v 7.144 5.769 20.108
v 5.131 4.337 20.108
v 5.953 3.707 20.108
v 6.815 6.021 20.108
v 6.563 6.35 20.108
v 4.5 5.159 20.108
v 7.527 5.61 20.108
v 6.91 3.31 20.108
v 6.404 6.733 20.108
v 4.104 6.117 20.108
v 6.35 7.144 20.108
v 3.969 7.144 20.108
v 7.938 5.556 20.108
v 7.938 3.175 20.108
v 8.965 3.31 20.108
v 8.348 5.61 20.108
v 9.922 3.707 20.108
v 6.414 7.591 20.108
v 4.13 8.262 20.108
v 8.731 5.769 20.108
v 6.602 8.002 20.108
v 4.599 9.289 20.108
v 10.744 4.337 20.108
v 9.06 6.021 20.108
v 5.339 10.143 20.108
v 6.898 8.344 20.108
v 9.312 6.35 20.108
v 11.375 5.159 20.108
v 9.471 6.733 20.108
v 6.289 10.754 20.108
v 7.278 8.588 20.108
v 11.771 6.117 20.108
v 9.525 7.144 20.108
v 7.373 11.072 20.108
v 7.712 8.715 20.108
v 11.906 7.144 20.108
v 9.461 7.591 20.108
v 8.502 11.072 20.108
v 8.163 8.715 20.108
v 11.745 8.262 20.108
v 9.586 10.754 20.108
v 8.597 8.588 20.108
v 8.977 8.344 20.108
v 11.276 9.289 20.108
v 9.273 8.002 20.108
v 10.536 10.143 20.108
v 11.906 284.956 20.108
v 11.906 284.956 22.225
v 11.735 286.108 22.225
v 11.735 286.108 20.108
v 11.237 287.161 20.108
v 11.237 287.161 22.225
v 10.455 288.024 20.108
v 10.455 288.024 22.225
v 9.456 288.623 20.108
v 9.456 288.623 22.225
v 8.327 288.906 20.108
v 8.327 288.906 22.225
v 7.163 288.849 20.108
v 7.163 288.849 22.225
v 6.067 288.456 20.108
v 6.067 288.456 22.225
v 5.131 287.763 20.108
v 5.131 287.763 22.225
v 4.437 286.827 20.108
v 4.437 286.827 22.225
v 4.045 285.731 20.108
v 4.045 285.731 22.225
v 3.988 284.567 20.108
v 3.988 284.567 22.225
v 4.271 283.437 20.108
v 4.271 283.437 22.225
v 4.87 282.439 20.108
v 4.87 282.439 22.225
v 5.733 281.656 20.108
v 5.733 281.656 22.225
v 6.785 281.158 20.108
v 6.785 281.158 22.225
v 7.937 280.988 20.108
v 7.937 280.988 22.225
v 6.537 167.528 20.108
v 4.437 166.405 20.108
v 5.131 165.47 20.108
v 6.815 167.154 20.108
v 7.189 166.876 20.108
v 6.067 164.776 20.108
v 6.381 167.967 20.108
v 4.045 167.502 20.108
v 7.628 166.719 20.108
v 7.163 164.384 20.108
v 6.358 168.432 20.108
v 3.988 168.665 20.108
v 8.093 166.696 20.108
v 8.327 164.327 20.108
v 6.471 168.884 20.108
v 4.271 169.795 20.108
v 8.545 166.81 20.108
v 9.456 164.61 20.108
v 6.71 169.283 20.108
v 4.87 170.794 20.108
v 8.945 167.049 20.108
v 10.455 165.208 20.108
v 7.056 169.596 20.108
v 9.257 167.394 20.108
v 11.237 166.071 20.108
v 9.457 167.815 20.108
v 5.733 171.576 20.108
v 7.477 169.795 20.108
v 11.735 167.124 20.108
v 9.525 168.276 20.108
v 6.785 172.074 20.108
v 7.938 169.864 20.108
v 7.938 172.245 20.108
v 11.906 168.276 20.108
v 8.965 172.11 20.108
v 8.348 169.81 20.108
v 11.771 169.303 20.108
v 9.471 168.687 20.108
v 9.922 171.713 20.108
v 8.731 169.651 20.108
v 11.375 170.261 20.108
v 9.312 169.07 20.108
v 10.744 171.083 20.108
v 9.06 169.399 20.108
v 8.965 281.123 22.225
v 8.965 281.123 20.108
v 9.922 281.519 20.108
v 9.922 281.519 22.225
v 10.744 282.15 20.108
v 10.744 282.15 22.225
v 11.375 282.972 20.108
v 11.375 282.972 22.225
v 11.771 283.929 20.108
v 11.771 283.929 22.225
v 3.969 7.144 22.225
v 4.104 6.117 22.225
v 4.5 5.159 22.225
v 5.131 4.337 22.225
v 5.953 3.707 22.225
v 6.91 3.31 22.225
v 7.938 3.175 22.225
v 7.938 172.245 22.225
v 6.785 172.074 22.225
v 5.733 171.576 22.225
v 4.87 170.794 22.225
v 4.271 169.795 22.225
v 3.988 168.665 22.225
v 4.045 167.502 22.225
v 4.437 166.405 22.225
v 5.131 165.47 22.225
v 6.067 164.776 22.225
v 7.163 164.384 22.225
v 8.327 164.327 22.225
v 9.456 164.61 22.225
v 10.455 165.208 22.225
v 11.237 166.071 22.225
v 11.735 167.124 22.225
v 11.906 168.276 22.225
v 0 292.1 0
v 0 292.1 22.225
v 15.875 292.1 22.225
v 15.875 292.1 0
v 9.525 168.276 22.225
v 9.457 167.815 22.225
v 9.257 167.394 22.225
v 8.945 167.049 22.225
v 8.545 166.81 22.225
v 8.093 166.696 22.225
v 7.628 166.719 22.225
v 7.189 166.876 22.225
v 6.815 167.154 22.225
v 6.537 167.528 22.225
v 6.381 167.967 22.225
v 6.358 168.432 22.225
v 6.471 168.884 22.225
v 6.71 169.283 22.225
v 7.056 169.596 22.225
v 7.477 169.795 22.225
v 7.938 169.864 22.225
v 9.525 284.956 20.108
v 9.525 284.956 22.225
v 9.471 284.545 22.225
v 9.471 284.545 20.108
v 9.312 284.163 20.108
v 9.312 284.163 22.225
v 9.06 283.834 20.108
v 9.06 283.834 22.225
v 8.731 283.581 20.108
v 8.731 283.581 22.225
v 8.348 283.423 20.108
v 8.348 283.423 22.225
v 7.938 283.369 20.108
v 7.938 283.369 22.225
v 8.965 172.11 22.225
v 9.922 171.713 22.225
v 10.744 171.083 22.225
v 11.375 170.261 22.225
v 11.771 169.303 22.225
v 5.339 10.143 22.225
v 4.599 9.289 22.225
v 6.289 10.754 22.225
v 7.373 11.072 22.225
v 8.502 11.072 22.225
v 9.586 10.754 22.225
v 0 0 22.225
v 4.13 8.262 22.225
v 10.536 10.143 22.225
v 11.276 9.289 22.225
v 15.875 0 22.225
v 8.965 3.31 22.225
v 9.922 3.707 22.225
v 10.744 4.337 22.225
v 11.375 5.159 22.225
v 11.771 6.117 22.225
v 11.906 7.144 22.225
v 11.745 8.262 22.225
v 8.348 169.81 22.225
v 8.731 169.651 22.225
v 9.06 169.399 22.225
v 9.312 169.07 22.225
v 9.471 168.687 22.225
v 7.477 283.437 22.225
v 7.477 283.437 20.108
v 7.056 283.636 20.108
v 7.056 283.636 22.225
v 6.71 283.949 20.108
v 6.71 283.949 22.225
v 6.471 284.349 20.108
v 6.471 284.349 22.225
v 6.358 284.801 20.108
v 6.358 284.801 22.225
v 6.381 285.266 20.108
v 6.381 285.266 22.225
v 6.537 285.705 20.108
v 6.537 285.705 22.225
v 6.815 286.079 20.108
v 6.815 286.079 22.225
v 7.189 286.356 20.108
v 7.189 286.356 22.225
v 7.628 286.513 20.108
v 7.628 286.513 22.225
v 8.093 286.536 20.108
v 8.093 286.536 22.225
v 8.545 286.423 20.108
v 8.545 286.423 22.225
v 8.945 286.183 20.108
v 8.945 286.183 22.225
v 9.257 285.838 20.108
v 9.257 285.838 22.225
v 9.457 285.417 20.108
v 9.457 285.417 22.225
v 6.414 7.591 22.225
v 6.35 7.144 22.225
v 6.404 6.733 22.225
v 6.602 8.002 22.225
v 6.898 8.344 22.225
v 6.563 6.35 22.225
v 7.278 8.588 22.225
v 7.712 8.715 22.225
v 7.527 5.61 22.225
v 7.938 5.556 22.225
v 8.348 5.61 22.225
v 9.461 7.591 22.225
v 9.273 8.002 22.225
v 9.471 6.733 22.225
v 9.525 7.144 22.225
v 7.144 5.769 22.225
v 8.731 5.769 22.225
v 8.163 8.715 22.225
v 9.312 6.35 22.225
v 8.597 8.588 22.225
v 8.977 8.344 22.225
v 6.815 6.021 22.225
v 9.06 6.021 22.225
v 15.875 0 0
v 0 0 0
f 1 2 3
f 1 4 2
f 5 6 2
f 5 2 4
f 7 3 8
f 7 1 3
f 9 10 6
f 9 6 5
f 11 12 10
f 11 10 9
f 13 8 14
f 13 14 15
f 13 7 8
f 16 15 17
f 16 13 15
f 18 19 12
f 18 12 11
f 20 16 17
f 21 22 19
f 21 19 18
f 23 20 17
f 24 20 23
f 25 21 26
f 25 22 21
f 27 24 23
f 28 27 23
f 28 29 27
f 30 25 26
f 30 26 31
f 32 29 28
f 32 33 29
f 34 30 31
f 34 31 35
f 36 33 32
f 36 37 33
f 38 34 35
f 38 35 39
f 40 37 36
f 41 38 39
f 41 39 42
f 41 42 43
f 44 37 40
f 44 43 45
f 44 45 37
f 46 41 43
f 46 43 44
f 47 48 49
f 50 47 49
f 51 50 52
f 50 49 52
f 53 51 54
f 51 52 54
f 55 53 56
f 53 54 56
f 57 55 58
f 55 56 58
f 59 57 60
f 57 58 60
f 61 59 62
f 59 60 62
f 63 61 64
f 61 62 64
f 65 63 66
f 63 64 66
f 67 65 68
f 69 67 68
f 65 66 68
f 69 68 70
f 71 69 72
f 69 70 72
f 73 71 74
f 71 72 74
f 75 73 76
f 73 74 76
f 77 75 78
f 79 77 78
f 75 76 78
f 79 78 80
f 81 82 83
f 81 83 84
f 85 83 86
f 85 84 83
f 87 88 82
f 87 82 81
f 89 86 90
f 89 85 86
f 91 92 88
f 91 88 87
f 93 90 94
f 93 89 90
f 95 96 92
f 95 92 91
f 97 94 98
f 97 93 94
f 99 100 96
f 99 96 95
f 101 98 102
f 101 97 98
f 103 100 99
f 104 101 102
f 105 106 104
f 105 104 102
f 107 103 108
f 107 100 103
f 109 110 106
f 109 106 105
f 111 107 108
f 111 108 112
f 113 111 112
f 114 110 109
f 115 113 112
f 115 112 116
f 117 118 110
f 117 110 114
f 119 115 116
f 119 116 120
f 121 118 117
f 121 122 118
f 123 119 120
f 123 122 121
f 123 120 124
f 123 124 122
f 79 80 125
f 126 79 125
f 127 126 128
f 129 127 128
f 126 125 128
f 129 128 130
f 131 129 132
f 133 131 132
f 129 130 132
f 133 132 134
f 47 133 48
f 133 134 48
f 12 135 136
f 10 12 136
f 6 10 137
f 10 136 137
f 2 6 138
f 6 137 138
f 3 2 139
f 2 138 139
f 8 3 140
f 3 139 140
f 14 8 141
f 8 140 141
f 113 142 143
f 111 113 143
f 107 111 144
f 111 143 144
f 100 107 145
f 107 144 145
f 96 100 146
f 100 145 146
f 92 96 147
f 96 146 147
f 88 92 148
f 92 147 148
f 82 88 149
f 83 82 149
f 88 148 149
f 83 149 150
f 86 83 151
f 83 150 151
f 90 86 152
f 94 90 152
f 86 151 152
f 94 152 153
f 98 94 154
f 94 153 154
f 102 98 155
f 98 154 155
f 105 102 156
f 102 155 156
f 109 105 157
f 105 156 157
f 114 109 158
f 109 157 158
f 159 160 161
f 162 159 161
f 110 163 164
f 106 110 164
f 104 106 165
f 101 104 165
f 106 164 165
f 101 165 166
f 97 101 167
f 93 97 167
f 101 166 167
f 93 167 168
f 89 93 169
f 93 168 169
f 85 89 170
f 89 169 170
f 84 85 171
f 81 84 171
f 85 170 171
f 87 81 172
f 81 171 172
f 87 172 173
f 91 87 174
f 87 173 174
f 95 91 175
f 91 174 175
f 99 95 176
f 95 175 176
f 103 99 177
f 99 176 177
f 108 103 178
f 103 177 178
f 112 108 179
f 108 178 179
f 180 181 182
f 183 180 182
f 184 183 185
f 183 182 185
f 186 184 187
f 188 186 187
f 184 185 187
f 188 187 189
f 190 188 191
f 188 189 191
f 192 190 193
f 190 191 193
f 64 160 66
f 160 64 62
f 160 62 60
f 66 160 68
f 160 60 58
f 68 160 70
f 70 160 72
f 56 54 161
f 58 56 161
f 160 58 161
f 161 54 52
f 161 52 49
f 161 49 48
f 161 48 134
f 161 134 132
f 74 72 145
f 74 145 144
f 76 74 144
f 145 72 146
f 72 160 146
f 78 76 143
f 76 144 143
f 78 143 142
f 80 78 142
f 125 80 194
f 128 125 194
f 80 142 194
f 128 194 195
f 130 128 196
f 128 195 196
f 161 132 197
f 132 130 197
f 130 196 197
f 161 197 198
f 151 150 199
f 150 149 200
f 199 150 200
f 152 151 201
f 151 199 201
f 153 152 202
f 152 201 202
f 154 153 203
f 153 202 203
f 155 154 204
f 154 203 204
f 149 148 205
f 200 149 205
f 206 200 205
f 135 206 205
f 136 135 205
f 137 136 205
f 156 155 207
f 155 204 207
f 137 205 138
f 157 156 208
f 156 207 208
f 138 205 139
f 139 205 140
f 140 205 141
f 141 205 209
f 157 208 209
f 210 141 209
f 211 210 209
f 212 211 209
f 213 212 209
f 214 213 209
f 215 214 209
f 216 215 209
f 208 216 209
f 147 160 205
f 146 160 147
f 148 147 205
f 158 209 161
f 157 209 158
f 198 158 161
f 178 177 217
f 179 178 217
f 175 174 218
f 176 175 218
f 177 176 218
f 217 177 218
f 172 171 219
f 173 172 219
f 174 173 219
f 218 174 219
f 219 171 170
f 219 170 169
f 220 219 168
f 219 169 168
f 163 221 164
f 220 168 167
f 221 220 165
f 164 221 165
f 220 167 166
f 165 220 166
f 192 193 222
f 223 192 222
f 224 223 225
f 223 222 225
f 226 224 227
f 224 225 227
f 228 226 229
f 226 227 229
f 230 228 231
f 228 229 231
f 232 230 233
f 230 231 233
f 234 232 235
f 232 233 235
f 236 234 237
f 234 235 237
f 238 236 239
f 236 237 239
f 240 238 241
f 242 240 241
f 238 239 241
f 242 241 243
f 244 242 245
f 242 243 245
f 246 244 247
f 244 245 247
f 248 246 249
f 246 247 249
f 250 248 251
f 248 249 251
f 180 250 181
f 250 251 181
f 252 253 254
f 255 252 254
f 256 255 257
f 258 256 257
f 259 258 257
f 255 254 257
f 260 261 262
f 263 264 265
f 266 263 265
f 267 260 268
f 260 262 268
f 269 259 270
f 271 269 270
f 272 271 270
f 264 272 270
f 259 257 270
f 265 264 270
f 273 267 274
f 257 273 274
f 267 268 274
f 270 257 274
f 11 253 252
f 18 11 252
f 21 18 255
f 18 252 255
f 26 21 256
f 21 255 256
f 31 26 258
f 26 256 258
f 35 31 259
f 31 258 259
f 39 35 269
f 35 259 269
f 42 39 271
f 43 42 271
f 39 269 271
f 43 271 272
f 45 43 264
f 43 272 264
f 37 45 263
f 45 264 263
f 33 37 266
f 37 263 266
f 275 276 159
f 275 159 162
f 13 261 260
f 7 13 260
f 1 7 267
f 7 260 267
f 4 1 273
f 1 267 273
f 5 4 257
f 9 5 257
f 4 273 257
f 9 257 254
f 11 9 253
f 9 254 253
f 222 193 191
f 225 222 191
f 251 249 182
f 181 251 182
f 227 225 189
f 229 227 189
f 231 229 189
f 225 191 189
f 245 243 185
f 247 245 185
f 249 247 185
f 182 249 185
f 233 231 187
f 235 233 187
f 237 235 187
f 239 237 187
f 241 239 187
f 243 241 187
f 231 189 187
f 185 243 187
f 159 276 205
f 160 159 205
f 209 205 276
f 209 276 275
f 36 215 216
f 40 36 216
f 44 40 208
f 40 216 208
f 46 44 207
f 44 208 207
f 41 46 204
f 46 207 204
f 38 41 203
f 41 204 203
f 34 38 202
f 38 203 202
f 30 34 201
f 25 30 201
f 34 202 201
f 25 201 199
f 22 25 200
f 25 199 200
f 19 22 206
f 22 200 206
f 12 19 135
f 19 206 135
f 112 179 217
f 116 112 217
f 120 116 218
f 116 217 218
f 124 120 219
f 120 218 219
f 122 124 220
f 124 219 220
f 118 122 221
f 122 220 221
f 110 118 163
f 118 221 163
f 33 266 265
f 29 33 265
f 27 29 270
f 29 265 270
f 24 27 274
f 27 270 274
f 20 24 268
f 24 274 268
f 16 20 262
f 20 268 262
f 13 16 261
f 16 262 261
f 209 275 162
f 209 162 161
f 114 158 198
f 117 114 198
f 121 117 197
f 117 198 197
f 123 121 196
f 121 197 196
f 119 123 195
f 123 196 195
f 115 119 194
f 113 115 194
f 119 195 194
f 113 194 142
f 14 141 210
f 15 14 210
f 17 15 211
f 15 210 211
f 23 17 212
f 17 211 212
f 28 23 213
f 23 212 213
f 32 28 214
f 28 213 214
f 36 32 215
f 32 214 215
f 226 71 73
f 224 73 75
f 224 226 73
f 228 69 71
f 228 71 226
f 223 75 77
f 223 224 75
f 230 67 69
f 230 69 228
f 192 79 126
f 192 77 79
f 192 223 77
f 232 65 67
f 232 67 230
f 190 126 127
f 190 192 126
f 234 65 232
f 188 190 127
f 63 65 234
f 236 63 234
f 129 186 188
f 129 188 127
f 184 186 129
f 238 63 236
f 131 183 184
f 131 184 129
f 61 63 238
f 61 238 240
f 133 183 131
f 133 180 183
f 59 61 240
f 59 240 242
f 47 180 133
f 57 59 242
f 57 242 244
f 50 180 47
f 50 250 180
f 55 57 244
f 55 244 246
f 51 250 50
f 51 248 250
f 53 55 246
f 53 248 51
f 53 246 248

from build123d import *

# Parameters (mm, degrees)
F0_W     = 15.875
F0_H     = 22.225
F1_DEPTH = 292.1
F3_DEPTH = 2.1166666667


with BuildPart() as f1:
    # F0 (on Front) → F1 (new body)
    with BuildSketch(Plane.XZ):
        with Locations((7.9375, 11.1125)):
            Rectangle(F0_W, F0_H)
    extrude(amount=-F1_DEPTH)

    # F2 (on face) → F3 (cut)
    with BuildSketch(Plane.XY.offset(22.225)):
        with BuildLine():
            ThreePointArc((7.9375, 280.9875), (10.7438300378, 282.1499199622), (11.90625, 284.95625))
            ThreePointArc((11.90625, 284.95625), (5.1311699622, 287.7625800378), (7.9375, 280.9875))
        make_face()
        with BuildLine():
            ThreePointArc((9.525, 284.95625), (9.0600320151, 283.8337179849), (7.9375, 283.36875))
            ThreePointArc((7.9375, 283.36875), (6.8149679849, 286.0787820151), (9.525, 284.95625))
        make_face(mode=Mode.SUBTRACT)
        with BuildLine():
            ThreePointArc((11.90625, 168.27627), (10.7438300378, 171.0826000378), (7.9375, 172.24502))
            ThreePointArc((7.9375, 172.24502), (5.1311699622, 165.4699399622), (11.90625, 168.27627))
        make_face()
        with BuildLine():
            ThreePointArc((9.525, 168.27627), (6.8149679849, 167.1537379849), (7.9375, 169.86377))
            ThreePointArc((7.9375, 169.86377), (9.0600320151, 169.3988020151), (9.525, 168.27627))
        make_face(mode=Mode.SUBTRACT)
        with BuildLine():
            Line((9.525, 7.14375), (11.90625, 7.14375))
            ThreePointArc((11.90625, 7.14375), (7.9375, 11.1125), (3.96875, 7.14375))
            Line((3.96875, 7.14375), (6.35, 7.14375))
            ThreePointArc((6.35, 7.14375), (7.9375, 8.73125), (9.525, 7.14375))
        make_face()
        with BuildLine():
            Line((6.35, 7.14375), (3.96875, 7.14375))
            ThreePointArc((3.96875, 7.14375), (5.1311699622, 4.3374199622), (7.9375, 3.175))
            Line((7.9375, 3.175), (7.9375, 5.55625))
            ThreePointArc((7.9375, 5.55625), (6.8149679849, 6.0212179849), (6.35, 7.14375))
        make_face()
        with BuildLine():
            ThreePointArc((7.9375, 3.175), (10.7438300378, 4.3374199622), (11.90625, 7.14375))
            Line((11.90625, 7.14375), (9.525, 7.14375))
            ThreePointArc((9.525, 7.14375), (9.0600320151, 6.0212179849), (7.9375, 5.55625))
            Line((7.9375, 5.55625), (7.9375, 3.175))
        make_face()
    extrude(amount=-F3_DEPTH, mode=Mode.SUBTRACT)


solid = f1.part
